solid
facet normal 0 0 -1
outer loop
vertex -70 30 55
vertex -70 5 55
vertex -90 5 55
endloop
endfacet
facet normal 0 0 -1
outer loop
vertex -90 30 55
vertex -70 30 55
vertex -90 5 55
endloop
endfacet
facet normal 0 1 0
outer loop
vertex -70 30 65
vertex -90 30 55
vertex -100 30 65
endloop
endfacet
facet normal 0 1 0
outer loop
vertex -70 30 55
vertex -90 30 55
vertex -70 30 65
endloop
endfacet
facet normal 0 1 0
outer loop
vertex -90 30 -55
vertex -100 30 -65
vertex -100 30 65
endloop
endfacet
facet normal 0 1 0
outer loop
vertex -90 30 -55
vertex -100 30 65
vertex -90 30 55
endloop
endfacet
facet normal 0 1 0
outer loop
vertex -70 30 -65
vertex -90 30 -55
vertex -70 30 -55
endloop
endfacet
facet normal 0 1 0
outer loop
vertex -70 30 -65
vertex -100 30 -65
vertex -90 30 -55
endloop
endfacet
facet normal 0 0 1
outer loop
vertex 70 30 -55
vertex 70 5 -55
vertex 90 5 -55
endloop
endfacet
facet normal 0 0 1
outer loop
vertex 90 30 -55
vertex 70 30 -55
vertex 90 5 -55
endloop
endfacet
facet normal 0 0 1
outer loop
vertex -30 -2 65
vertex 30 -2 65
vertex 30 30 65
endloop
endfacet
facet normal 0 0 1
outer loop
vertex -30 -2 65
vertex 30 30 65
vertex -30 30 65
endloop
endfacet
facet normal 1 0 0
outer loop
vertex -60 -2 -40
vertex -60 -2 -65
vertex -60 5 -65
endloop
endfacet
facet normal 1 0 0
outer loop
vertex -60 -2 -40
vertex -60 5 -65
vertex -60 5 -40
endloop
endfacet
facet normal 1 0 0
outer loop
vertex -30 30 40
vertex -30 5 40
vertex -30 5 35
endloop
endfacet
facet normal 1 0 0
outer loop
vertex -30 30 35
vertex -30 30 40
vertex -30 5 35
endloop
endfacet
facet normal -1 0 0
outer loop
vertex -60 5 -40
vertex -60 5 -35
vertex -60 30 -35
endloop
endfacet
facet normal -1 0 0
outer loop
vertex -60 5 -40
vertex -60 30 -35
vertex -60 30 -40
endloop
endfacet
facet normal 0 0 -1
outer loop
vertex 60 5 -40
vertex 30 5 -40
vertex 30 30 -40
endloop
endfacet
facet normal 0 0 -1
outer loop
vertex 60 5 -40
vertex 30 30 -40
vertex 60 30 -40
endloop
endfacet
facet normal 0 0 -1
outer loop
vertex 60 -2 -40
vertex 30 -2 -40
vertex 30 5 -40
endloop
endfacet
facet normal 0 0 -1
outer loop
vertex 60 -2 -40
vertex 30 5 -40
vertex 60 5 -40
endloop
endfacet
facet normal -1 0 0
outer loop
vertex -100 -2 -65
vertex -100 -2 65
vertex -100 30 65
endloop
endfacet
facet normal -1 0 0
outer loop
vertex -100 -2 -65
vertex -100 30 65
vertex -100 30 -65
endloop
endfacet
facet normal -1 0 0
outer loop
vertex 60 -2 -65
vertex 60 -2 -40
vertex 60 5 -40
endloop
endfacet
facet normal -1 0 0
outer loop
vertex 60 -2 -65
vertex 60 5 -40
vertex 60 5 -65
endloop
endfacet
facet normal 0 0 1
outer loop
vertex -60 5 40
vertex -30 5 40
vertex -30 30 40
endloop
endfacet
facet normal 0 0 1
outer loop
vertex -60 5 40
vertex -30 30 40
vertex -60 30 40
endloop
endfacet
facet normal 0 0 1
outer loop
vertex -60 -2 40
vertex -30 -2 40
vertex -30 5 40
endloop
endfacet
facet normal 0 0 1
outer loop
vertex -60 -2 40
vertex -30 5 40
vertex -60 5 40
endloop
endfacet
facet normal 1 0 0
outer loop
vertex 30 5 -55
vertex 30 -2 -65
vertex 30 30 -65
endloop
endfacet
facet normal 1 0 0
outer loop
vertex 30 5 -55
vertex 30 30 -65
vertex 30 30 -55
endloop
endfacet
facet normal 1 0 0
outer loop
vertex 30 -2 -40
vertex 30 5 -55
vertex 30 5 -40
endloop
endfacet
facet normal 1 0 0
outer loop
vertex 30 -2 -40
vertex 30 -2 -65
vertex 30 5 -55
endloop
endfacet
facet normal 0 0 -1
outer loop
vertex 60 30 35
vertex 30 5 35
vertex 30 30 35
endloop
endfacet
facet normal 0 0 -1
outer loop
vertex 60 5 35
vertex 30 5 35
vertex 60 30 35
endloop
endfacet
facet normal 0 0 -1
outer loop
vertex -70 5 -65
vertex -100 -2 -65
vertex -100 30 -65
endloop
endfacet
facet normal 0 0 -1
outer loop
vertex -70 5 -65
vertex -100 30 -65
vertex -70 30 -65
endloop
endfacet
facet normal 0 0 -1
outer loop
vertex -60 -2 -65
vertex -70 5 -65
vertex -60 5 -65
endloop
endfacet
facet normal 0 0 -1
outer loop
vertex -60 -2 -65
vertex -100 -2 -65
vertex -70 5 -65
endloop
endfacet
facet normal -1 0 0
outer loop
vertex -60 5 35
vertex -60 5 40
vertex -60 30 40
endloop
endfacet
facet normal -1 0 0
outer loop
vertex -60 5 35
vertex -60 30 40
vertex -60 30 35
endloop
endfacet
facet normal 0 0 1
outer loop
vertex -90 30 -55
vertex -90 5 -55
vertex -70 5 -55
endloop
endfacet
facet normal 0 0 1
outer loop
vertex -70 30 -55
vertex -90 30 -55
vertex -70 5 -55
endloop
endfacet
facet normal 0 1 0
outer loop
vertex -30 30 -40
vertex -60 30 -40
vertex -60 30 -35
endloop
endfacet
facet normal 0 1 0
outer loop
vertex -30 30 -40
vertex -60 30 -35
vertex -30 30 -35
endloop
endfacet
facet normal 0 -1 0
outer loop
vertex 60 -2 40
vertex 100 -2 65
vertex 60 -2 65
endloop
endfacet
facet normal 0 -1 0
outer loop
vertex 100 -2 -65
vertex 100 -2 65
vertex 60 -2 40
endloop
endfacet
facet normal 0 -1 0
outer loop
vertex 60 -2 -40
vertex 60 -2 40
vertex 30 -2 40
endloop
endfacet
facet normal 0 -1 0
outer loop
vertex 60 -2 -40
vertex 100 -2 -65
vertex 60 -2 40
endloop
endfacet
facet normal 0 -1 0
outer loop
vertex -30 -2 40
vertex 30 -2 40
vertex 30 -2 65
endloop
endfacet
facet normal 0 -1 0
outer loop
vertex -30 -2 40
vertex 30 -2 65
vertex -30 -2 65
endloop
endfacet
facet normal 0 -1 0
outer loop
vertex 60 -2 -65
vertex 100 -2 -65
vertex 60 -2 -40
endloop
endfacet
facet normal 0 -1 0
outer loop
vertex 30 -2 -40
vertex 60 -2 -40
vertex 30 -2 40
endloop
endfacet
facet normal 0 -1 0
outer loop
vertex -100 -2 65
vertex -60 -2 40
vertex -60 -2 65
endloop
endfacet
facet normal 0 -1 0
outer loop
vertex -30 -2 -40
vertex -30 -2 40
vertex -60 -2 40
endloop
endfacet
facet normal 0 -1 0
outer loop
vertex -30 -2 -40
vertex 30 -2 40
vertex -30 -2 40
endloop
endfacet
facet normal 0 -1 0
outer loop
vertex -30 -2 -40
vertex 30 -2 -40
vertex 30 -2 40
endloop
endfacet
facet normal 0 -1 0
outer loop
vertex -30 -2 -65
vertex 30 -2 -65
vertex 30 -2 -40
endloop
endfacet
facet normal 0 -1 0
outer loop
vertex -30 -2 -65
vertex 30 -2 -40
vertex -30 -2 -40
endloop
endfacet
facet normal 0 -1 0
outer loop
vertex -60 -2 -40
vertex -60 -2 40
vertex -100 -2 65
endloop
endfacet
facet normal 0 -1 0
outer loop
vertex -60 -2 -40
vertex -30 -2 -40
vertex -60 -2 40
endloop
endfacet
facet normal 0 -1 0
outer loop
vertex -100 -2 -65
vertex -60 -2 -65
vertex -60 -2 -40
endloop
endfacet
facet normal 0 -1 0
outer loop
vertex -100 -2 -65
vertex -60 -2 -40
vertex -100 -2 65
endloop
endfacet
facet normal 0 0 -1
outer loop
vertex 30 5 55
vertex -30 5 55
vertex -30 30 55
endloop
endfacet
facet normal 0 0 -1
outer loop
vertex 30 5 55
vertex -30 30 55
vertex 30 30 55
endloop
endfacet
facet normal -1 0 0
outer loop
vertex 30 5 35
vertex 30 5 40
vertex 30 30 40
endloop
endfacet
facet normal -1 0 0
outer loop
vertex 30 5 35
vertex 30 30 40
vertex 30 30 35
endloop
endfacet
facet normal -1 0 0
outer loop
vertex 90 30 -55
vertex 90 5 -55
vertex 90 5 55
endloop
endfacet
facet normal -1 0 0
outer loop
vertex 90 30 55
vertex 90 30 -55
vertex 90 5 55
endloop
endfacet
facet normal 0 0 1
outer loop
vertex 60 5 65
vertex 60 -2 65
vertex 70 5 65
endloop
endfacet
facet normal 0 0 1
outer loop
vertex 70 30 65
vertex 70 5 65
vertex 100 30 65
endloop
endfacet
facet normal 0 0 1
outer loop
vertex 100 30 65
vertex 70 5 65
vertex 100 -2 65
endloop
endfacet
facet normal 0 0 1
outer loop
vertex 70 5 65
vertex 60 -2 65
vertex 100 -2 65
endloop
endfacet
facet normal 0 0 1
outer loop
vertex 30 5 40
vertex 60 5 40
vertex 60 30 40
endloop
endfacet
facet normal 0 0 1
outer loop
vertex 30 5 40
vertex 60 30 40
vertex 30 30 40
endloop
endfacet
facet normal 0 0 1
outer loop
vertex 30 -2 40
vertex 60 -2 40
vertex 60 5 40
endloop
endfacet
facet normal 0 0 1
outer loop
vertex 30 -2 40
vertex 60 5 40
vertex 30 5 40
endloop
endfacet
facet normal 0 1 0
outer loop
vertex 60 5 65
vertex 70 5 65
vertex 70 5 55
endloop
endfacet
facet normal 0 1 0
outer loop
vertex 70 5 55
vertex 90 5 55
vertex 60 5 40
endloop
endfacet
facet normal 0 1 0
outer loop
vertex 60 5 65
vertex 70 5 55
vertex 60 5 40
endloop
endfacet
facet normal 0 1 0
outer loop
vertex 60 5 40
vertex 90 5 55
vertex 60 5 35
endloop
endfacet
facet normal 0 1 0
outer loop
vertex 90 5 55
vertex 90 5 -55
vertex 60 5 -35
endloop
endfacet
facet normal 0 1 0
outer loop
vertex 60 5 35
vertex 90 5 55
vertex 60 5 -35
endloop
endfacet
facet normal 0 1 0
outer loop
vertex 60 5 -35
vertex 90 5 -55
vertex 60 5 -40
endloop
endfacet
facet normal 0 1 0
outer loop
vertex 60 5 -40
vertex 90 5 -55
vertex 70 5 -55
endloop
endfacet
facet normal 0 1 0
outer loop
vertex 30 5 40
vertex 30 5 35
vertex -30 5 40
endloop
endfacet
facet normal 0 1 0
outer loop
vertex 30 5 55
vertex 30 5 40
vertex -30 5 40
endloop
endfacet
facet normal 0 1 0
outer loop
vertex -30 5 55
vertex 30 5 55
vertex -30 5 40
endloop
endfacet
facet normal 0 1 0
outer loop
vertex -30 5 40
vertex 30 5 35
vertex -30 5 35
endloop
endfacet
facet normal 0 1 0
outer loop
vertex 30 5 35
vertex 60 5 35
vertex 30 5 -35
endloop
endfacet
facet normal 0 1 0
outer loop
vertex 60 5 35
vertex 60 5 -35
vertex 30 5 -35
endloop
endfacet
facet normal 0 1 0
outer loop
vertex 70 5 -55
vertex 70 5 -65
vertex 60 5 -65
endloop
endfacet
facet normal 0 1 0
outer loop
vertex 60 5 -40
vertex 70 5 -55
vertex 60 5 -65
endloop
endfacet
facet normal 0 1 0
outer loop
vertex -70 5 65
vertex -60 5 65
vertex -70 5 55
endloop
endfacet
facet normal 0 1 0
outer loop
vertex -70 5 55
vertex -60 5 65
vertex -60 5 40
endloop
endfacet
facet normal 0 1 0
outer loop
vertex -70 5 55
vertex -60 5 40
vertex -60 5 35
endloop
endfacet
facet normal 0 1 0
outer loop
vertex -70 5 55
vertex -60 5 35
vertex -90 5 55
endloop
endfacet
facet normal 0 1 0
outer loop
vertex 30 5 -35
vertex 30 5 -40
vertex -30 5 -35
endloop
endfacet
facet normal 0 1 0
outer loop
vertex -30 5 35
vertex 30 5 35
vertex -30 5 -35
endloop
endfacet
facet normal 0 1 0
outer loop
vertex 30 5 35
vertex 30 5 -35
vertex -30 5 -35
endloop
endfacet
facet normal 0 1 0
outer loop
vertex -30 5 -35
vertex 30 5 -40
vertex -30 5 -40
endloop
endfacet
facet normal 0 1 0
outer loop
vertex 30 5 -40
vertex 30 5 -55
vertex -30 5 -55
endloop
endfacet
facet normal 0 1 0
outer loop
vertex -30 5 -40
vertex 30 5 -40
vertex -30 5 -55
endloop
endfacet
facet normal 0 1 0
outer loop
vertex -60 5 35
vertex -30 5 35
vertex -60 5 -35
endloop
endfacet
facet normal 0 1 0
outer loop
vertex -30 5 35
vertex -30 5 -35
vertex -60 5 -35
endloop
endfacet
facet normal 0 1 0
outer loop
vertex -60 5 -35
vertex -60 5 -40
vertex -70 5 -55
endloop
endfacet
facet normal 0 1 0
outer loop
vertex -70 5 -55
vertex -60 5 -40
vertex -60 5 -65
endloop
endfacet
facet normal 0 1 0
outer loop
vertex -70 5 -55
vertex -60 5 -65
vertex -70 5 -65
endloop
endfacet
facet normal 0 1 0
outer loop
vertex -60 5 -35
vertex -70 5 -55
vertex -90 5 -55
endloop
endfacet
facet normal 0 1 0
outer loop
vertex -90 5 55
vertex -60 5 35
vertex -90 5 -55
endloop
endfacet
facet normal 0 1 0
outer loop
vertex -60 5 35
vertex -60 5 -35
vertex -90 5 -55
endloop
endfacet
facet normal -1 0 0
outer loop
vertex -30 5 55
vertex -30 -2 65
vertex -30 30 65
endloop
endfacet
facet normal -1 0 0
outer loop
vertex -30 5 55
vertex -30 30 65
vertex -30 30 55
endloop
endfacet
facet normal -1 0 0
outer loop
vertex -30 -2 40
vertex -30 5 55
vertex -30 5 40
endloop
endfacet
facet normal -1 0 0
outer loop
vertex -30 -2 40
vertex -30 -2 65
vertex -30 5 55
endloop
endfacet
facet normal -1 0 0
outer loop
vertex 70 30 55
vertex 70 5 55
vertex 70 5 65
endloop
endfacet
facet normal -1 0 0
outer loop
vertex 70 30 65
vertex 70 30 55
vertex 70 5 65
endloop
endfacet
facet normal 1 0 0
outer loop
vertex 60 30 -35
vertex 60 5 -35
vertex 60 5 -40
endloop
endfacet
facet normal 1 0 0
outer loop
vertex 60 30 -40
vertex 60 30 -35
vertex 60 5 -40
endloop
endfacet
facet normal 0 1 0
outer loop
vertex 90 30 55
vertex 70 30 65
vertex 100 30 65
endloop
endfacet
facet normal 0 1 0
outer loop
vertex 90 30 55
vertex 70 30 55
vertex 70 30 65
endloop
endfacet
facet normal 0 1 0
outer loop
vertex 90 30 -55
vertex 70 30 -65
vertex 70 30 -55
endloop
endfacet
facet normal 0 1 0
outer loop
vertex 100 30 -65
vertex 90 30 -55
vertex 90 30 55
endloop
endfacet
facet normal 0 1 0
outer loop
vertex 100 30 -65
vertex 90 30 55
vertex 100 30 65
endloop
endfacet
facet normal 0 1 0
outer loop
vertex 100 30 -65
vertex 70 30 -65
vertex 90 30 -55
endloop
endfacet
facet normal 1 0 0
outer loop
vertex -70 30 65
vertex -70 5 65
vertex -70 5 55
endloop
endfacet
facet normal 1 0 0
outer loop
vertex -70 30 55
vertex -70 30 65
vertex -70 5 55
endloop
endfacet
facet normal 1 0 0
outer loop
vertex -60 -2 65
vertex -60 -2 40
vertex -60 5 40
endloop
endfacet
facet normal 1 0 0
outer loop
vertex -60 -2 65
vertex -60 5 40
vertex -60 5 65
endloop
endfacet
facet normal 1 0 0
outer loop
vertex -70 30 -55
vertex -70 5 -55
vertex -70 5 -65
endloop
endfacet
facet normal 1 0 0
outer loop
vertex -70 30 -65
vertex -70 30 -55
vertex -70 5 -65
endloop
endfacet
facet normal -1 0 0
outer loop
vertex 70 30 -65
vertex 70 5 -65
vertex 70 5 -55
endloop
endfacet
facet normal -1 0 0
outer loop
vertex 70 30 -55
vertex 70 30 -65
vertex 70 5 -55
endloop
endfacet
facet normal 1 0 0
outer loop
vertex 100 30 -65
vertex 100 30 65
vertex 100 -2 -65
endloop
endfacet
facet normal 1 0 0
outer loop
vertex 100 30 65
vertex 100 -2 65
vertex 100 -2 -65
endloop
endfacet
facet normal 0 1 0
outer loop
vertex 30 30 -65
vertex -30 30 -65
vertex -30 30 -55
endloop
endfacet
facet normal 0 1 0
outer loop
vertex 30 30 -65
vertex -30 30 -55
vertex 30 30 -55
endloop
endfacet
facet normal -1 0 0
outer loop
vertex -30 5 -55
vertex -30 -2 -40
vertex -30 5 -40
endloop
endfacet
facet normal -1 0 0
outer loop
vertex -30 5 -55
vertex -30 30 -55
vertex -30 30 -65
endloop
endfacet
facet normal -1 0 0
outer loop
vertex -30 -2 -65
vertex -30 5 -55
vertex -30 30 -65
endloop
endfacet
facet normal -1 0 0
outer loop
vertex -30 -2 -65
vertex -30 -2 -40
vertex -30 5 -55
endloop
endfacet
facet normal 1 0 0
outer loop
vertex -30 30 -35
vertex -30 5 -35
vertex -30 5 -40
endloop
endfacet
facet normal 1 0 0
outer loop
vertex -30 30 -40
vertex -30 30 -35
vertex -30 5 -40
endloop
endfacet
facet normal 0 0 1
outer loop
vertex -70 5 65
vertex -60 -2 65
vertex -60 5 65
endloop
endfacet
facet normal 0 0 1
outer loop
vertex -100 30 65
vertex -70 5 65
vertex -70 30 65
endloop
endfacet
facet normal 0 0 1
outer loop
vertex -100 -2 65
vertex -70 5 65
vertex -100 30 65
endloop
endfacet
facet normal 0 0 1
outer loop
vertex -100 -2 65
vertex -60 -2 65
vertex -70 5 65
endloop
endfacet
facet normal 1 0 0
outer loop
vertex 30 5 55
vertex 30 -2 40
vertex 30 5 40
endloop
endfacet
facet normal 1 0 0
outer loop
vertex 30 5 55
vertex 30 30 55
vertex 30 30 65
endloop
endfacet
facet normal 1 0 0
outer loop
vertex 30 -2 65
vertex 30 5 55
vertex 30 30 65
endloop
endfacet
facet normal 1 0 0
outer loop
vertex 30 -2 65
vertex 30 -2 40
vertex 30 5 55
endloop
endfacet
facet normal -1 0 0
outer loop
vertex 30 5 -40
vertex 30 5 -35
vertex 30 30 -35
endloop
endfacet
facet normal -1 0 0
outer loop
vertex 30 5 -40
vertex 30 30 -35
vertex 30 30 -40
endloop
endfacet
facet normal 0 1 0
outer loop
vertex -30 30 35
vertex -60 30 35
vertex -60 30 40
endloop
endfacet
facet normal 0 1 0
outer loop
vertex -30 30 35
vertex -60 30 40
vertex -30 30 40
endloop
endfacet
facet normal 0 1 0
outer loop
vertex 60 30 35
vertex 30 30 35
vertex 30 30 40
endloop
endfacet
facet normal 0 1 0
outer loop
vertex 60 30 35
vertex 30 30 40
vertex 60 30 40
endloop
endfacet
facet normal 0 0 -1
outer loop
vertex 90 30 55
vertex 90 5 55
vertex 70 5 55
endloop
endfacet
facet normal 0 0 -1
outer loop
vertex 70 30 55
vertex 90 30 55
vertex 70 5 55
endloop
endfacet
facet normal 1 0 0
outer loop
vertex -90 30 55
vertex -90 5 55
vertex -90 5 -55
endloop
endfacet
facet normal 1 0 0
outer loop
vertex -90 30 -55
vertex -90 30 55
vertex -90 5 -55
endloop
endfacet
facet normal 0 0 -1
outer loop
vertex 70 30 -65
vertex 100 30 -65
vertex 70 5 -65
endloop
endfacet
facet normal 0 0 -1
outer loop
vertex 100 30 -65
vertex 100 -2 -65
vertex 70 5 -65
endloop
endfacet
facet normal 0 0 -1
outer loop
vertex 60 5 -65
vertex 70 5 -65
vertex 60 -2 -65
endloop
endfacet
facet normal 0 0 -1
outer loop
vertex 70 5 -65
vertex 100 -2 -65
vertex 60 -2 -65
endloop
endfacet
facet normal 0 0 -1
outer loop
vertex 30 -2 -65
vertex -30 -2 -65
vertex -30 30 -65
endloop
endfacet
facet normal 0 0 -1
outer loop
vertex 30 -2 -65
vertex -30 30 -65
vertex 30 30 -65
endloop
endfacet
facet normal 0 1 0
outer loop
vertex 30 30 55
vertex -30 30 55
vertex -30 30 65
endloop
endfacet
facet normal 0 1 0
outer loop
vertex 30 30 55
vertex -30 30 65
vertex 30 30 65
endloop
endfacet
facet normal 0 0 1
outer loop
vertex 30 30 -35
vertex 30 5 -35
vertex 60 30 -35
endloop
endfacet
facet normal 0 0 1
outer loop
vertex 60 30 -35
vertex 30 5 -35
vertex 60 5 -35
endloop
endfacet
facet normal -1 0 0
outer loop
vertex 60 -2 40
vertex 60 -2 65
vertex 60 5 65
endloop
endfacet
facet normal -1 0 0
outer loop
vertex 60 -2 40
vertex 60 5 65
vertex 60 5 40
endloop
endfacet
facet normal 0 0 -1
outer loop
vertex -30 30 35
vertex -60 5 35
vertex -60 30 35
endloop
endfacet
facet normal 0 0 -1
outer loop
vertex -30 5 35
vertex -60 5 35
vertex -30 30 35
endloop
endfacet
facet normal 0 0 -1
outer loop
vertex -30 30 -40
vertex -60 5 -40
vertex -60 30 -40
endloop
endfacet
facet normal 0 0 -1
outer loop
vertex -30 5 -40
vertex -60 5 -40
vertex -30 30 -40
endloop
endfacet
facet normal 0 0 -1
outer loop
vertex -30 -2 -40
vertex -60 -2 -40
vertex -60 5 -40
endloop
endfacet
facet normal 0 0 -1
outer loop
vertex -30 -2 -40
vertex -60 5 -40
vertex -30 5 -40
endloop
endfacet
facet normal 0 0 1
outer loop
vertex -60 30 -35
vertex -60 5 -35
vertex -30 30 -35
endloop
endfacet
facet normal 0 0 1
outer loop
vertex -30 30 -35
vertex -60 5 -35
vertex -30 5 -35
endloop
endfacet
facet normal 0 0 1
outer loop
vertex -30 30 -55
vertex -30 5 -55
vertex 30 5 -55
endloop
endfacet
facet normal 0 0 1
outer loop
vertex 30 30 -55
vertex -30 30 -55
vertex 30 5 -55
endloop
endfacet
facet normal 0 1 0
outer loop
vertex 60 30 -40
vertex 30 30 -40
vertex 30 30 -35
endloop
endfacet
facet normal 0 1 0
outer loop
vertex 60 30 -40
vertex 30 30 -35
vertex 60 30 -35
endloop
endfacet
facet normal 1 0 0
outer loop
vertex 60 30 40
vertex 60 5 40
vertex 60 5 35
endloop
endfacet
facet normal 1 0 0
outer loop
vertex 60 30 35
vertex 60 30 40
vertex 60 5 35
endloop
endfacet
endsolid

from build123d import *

# Parameters (mm, degrees)
EXTRUDE_1_DEPTH      = 5
EXTRUDE_1_DEPTH_BACK = 2
SKETCH_2_W           = 30
SKETCH_2_H           = 5
EXTRUDE_2_DEPTH      = 25
SKETCH_3_W           = 60
SKETCH_3_H           = 10
EXTRUDE_3_DEPTH      = 25


with BuildPart() as part:
    # 草圖1 → 填料-伸長1 (new, two sides: drawn at the far end of the back side and taken through both)
    with BuildSketch(Plane(origin=(0, 0, 0), x_dir=(1, 0, 0), z_dir=(0, 1, 0)).offset(-EXTRUDE_1_DEPTH_BACK)):
        Polygon((-60, 65), (-60, 40), (-30, 40), (-30, 65), (30, 65), (30, 40), (60, 40), (60, 65), (100, 65), (100, -65), (60, -65), (60, -40), (30, -40), (30, -65), (-30, -65), (-30, -40), (-60, -40), (-60, -65), (-100, -65), (-100, 65), align=None)
    extrude(amount=EXTRUDE_1_DEPTH + EXTRUDE_1_DEPTH_BACK)

    # 草圖2 → 填料-伸長2 (add)
    with BuildSketch(Plane(origin=(0, 5, 0), x_dir=(1, 0, 0), z_dir=(0, 1, 0))):
        with Locations((-45, 37.5)):
            Rectangle(SKETCH_2_W, SKETCH_2_H)
        with Locations((-45, -37.5)):
            Rectangle(SKETCH_2_W, SKETCH_2_H)
        with Locations((45, -37.5)):
            Rectangle(SKETCH_2_W, SKETCH_2_H)
        with Locations((45, 37.5)):
            Rectangle(SKETCH_2_W, SKETCH_2_H)
    extrude(amount=EXTRUDE_2_DEPTH)

    # 草圖3 → 填料-伸長3 (add)
    with BuildSketch(Plane(origin=(0, 5, 0), x_dir=(1, 0, 0), z_dir=(0, 1, 0))):
        Polygon((70, -65), (100, -65), (100, 65), (70, 65), (70, 55), (90, 55), (90, -55), (70, -55), align=None)
        with Locations((0, 60)):
            Rectangle(SKETCH_3_W, SKETCH_3_H)
        with Locations((0, -60)):
            Rectangle(SKETCH_3_W, SKETCH_3_H)
        Polygon((-100, 65), (-100, -65), (-70, -65), (-70, -55), (-90, -55), (-90, 55), (-70, 55), (-70, 65), align=None)
    extrude(amount=EXTRUDE_3_DEPTH)


solid = part.part
